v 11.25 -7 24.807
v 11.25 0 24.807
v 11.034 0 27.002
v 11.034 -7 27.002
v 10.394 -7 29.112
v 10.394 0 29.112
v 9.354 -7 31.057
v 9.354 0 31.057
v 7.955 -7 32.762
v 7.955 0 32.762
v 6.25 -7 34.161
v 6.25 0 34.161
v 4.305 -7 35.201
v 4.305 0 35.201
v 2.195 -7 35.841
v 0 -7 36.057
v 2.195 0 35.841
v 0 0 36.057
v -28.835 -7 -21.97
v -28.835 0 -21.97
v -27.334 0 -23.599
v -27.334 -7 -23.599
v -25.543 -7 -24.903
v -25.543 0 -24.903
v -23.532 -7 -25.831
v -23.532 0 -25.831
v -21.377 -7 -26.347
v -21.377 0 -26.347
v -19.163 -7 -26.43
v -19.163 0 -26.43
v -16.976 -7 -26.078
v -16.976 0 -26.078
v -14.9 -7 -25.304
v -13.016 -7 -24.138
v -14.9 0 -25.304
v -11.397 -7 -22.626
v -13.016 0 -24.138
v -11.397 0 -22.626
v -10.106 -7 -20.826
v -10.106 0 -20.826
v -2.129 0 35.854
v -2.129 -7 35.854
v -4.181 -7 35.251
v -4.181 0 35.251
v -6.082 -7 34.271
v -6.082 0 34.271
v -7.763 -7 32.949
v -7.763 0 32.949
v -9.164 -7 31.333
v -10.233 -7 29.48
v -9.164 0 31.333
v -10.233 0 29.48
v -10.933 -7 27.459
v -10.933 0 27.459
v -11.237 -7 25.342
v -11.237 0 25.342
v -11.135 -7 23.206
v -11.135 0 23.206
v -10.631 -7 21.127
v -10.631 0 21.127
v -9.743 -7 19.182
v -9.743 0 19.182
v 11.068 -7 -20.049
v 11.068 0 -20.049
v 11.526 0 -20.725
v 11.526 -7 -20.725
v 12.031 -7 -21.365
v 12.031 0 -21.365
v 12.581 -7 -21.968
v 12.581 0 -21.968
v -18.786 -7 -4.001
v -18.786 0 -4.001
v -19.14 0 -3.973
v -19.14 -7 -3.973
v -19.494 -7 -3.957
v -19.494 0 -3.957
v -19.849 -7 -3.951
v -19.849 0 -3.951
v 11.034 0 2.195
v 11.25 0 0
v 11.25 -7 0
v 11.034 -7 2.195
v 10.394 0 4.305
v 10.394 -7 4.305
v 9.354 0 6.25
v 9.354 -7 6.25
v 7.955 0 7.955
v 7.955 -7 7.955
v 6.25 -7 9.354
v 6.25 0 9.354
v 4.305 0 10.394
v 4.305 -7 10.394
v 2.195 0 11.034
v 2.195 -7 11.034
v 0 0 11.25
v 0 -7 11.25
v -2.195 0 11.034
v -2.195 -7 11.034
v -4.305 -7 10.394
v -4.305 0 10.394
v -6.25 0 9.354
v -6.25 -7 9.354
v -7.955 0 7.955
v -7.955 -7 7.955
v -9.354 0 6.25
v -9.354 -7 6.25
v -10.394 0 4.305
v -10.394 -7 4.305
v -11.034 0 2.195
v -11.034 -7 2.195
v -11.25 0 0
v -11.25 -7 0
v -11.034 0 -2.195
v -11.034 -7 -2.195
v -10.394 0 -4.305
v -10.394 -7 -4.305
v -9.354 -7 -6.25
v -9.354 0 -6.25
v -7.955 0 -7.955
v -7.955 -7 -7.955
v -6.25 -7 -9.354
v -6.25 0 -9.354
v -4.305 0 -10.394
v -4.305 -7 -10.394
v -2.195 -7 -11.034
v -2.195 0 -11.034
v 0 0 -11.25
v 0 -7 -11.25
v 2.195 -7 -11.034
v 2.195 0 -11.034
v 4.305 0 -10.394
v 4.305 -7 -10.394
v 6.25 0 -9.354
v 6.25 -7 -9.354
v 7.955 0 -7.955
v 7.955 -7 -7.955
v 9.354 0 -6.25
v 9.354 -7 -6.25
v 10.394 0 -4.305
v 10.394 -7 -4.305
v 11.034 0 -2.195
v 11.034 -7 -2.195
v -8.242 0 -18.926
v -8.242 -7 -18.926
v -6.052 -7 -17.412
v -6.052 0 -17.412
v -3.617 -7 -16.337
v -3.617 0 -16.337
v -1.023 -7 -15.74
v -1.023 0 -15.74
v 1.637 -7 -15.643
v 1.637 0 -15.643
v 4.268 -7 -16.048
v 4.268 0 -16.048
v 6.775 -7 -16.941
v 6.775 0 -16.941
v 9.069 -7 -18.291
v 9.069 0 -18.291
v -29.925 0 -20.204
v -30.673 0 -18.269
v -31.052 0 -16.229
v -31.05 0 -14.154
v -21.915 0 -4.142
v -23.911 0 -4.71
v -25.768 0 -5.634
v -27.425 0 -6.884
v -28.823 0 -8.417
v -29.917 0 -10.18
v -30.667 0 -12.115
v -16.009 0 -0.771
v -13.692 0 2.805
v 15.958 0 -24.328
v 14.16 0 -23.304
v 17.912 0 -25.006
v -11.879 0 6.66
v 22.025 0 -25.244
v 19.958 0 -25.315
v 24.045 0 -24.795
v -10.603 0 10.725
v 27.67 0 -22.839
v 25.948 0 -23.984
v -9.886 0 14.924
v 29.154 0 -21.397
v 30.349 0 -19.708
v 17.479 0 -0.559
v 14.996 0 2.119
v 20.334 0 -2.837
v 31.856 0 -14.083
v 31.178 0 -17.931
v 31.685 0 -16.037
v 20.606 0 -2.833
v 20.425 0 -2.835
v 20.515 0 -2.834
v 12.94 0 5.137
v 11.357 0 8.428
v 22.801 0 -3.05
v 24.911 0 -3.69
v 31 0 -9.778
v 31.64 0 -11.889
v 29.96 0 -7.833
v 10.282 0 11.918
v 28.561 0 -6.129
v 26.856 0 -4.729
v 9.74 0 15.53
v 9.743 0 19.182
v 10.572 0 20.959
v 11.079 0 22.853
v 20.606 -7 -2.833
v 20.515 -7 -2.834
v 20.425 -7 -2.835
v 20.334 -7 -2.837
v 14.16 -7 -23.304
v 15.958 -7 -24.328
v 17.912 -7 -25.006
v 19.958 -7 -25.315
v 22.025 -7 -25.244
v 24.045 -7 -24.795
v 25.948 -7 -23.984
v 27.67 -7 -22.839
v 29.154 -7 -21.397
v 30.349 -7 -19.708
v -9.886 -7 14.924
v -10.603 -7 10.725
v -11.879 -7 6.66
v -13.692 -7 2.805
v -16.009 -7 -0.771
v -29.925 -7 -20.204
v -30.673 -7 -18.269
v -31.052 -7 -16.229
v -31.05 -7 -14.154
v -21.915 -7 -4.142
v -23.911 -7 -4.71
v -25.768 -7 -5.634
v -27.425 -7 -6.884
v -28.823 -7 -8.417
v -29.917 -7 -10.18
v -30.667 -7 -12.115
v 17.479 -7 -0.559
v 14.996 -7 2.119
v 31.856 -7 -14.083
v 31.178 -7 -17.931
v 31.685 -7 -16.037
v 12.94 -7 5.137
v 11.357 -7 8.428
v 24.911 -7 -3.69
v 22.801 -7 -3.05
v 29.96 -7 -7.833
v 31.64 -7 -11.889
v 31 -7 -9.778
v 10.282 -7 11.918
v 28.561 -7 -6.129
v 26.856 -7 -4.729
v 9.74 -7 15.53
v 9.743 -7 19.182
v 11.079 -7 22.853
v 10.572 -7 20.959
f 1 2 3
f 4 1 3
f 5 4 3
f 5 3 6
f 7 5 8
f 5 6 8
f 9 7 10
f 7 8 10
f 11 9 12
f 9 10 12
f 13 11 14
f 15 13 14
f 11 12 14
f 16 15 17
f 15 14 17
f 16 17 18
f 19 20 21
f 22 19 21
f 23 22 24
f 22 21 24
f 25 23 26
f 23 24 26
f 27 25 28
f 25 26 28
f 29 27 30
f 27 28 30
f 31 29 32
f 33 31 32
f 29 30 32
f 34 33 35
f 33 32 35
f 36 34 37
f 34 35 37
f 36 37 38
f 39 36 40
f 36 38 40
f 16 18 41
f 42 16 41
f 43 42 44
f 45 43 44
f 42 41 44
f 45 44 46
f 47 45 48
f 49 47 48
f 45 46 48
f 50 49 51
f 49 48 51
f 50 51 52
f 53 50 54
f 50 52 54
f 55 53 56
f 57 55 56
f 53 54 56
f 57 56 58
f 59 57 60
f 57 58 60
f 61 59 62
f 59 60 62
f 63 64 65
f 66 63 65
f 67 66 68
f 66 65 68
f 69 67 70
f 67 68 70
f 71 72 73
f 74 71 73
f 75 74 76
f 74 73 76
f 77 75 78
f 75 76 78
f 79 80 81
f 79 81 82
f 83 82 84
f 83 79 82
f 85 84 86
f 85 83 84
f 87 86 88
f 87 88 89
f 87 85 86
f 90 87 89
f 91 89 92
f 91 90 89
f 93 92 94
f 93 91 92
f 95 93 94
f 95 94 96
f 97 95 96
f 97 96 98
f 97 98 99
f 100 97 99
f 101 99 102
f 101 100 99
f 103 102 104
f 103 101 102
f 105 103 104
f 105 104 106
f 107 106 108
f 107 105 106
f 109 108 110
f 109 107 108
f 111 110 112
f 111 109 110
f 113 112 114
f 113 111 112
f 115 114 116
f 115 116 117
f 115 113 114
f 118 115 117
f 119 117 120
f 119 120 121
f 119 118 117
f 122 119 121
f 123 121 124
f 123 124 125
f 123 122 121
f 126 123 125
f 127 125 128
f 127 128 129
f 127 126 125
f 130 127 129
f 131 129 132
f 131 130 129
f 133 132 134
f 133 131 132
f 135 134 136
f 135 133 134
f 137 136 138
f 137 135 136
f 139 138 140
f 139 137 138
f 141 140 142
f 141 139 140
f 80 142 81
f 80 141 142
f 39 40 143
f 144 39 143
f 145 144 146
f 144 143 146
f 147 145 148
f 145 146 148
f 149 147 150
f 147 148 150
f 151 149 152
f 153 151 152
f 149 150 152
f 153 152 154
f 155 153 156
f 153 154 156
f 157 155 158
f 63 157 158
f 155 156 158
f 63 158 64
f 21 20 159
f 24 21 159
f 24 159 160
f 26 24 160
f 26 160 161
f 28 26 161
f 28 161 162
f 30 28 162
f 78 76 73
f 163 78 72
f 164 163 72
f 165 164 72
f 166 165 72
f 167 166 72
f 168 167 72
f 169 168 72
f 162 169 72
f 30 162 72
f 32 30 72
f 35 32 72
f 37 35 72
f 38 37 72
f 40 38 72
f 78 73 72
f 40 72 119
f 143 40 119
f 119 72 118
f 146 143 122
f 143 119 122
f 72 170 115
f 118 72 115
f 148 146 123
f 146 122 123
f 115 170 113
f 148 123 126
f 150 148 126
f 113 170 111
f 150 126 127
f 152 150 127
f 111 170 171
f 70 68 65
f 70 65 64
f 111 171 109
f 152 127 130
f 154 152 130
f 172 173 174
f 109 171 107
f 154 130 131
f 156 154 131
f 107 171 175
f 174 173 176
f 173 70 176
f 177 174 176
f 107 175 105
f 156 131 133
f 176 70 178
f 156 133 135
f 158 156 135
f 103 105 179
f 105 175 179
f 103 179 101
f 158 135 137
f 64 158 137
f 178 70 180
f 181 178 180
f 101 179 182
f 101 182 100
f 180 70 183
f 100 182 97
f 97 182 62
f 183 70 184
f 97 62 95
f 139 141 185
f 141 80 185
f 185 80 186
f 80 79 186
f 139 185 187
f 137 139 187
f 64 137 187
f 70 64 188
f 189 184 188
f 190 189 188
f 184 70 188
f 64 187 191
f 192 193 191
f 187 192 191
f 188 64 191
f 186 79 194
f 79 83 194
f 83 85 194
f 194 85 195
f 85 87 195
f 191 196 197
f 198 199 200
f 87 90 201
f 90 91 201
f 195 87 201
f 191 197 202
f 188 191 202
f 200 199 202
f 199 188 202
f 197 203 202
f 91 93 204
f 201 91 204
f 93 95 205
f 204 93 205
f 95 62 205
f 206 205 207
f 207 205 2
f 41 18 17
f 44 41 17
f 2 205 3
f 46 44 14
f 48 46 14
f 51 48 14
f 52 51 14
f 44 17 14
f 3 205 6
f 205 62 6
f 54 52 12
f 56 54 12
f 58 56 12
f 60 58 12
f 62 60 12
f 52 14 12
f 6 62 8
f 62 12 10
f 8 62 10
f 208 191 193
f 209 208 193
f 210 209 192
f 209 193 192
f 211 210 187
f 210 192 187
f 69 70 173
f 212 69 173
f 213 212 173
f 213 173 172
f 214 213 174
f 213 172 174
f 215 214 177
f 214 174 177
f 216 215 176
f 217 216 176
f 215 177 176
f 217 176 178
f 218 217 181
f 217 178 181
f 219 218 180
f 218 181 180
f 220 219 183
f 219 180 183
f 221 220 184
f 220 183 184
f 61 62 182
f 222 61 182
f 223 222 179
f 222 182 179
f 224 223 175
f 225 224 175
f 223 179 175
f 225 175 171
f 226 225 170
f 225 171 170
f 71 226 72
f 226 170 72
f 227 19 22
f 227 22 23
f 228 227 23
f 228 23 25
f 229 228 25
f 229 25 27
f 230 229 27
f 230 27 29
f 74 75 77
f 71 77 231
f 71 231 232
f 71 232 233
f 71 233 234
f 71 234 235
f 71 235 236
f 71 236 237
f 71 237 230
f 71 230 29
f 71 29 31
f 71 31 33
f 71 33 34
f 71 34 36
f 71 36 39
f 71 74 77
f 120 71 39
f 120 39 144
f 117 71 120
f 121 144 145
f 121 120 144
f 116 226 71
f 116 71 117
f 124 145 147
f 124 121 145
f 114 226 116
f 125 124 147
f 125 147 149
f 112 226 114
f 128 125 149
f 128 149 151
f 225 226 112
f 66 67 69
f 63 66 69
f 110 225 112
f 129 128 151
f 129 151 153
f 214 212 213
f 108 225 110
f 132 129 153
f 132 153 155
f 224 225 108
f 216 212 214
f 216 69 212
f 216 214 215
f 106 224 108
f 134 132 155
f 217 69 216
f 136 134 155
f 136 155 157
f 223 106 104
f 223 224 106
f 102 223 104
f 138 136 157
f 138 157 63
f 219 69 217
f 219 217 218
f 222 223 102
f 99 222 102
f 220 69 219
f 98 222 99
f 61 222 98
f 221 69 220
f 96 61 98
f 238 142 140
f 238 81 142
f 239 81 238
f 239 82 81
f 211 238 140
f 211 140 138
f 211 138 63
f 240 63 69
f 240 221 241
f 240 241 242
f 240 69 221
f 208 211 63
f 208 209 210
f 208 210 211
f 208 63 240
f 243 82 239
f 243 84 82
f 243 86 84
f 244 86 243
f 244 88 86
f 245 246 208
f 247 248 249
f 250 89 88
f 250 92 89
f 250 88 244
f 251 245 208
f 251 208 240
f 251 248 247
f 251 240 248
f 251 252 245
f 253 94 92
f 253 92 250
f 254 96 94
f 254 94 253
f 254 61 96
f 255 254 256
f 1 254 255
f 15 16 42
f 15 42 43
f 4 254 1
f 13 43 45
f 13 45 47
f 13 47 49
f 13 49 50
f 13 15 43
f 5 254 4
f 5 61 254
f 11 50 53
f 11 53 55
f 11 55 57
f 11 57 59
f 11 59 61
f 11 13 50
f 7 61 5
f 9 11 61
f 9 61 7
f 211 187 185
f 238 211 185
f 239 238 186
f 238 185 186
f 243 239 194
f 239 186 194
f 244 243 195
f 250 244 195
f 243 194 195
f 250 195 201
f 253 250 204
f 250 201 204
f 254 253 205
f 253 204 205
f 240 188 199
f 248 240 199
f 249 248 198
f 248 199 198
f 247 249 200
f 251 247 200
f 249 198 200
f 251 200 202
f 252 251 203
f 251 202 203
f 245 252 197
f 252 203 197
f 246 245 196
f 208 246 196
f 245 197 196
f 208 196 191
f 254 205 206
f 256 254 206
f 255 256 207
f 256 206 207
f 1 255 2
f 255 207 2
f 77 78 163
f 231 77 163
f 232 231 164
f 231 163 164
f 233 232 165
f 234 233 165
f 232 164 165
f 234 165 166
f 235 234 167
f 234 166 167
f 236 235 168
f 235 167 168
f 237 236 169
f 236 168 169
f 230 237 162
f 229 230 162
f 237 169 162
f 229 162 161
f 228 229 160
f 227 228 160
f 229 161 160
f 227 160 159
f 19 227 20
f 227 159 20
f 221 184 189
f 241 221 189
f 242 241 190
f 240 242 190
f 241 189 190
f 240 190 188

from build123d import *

# Parameters (mm, degrees)
F0_R     = 11.25
F1_DEPTH = 7


with BuildPart() as f1:
    # F0 (on Front) → F1 (new body)
    with BuildSketch(Plane.XZ):
        with BuildLine():
            Line((0, 24.8070023954), (-9.7427857926, 19.1820023954))
            ThreePointArc((-9.7427857926, 19.1820023954), (0, 13.5570023954), (9.7427857926, 19.1820023954))
            Line((9.7427857926, 19.1820023954), (0, 24.8070023954))
        make_face()
        with BuildLine():
            ThreePointArc((0, 36.0570023954), (-9.7427857926, 30.4320023954), (-9.7427857926, 19.1820023954))
            Line((-9.7427857926, 19.1820023954), (0, 24.8070023954))
            Line((0, 24.8070023954), (0, 36.0570023954))
        make_face()
        with BuildLine():
            ThreePointArc((9.7427857926, 19.1820023954), (0, 13.5570023954), (-9.7427857926, 19.1820023954))
            ThreePointArc((-9.7427857926, 19.1820023954), (-11.8794963915, 6.6600701003), (-18.785878025, -4.0013656998))
            ThreePointArc((-18.785878025, -4.0013656998), (-11.5266597843, -7.6312649105), (-8.5989967734, -15.2010209858))
            ThreePointArc((-8.5989967734, -15.2010209858), (-8.9823312276, -18.1127352432), (-10.1062109808, -20.8260209858))
            ThreePointArc((-10.1062109808, -20.8260209858), (0.3044783334, -15.6283312232), (11.0680600024, -20.0491615206))
            ThreePointArc((11.0680600024, -20.0491615206), (10.7001408508, -8.750972982), (20.3337626304, -2.8367731067))
            ThreePointArc((20.3337626304, -2.8367731067), (12.0864921747, 6.7528147477), (9.7427857926, 19.1820023954))
        make_face()
        Circle(F0_R, mode=Mode.SUBTRACT)
        with BuildLine():
            Line((0, 24.8070023954), (9.7427857926, 19.1820023954))
            ThreePointArc((9.7427857926, 19.1820023954), (10.8666655458, 21.895288138), (11.25, 24.8070023954))
            ThreePointArc((11.25, 24.8070023954), (7.9549512883, 32.7619536837), (0, 36.0570023954))
            Line((0, 36.0570023954), (0, 24.8070023954))
        make_face()
        with BuildLine():
            ThreePointArc((-19.8489967734, -5.0313835964), (-19.3113897365, -4.5226166596), (-18.785878025, -4.0013656998))
            ThreePointArc((-18.785878025, -4.0013656998), (-19.3168417059, -3.9636142127), (-19.8489967734, -3.9510209858))
            Line((-19.8489967734, -3.9510209858), (-19.8489967734, -5.0313835964))
        make_face()
        with BuildLine():
            ThreePointArc((-8.5989967734, -15.2010209858), (-11.5266597843, -7.6312649105), (-18.785878025, -4.0013656998))
            ThreePointArc((-18.785878025, -4.0013656998), (-19.3113897365, -4.5226166596), (-19.8489967734, -5.0313835964))
            Line((-19.8489967734, -5.0313835964), (-19.8489967734, -15.2010209858))
            Line((-19.8489967734, -15.2010209858), (-10.1062109808, -20.8260209858))
            ThreePointArc((-10.1062109808, -20.8260209858), (-8.9823312276, -18.1127352432), (-8.5989967734, -15.2010209858))
        make_face()
        with BuildLine():
            ThreePointArc((20.6060428172, -3.0198064633), (20.4695953446, -2.928747042), (20.3337626304, -2.8367731067))
            ThreePointArc((20.3337626304, -2.8367731067), (10.7001408508, -8.750972982), (11.0680600024, -20.0491615206))
            ThreePointArc((11.0680600024, -20.0491615206), (11.8662666045, -20.9755321249), (12.5810078032, -21.9677222755))
            Line((12.5810078032, -21.9677222755), (20.6060428172, -14.0834776685))
            Line((20.6060428172, -14.0834776685), (20.6060428172, -3.0198064633))
        make_face()
        with BuildLine():
            ThreePointArc((20.6060428172, -2.8334776685), (20.4698927529, -2.8343015582), (20.3337626304, -2.8367731067))
            ThreePointArc((20.3337626304, -2.8367731067), (20.4695953446, -2.928747042), (20.6060428172, -3.0198064633))
            Line((20.6060428172, -3.0198064633), (20.6060428172, -2.8334776685))
        make_face()
        with BuildLine():
            Line((-19.8489967734, -5.0313835964), (-19.8489967734, -3.9510209858))
            ThreePointArc((-19.8489967734, -3.9510209858), (-29.9165162791, -10.1803087852), (-28.834973309, -21.9696785855))
            Line((-28.834973309, -21.9696785855), (-19.8489967734, -15.2010209858))
            Line((-19.8489967734, -15.2010209858), (-19.8489967734, -5.0313835964))
        make_face()
        with BuildLine():
            ThreePointArc((31.8560428172, -14.0834776685), (28.5609941056, -6.1285263801), (20.6060428172, -2.8334776685))
            Line((20.6060428172, -2.8334776685), (20.6060428172, -3.0198064633))
            Line((20.6060428172, -3.0198064633), (20.6060428172, -14.0834776685))
            Line((20.6060428172, -14.0834776685), (30.3488286098, -19.7084776685))
            ThreePointArc((30.3488286098, -19.7084776685), (31.472708363, -16.9951919259), (31.8560428172, -14.0834776685))
        make_face()
        with BuildLine():
            ThreePointArc((12.5810078032, -21.9677222755), (11.8662666045, -20.9755321249), (11.0680600024, -20.0491615206))
            ThreePointArc((11.0680600024, -20.0491615206), (11.7722940288, -21.0496374673), (12.5810078032, -21.9677222755))
        make_face()
        with BuildLine():
            ThreePointArc((-28.834973309, -21.9696785855), (-19.1633013314, -26.4301047312), (-10.1062109808, -20.8260209858))
            Line((-10.1062109808, -20.8260209858), (-19.8489967734, -15.2010209858))
            Line((-19.8489967734, -15.2010209858), (-28.834973309, -21.9696785855))
        make_face()
        with BuildLine():
            Line((20.6060428172, -14.0834776685), (12.5810078032, -21.9677222755))
            ThreePointArc((12.5810078032, -21.9677222755), (22.0250965452, -25.2436204327), (30.3488286098, -19.7084776685))
            Line((30.3488286098, -19.7084776685), (20.6060428172, -14.0834776685))
        make_face()
    extrude(amount=F1_DEPTH)


solid = f1.part
